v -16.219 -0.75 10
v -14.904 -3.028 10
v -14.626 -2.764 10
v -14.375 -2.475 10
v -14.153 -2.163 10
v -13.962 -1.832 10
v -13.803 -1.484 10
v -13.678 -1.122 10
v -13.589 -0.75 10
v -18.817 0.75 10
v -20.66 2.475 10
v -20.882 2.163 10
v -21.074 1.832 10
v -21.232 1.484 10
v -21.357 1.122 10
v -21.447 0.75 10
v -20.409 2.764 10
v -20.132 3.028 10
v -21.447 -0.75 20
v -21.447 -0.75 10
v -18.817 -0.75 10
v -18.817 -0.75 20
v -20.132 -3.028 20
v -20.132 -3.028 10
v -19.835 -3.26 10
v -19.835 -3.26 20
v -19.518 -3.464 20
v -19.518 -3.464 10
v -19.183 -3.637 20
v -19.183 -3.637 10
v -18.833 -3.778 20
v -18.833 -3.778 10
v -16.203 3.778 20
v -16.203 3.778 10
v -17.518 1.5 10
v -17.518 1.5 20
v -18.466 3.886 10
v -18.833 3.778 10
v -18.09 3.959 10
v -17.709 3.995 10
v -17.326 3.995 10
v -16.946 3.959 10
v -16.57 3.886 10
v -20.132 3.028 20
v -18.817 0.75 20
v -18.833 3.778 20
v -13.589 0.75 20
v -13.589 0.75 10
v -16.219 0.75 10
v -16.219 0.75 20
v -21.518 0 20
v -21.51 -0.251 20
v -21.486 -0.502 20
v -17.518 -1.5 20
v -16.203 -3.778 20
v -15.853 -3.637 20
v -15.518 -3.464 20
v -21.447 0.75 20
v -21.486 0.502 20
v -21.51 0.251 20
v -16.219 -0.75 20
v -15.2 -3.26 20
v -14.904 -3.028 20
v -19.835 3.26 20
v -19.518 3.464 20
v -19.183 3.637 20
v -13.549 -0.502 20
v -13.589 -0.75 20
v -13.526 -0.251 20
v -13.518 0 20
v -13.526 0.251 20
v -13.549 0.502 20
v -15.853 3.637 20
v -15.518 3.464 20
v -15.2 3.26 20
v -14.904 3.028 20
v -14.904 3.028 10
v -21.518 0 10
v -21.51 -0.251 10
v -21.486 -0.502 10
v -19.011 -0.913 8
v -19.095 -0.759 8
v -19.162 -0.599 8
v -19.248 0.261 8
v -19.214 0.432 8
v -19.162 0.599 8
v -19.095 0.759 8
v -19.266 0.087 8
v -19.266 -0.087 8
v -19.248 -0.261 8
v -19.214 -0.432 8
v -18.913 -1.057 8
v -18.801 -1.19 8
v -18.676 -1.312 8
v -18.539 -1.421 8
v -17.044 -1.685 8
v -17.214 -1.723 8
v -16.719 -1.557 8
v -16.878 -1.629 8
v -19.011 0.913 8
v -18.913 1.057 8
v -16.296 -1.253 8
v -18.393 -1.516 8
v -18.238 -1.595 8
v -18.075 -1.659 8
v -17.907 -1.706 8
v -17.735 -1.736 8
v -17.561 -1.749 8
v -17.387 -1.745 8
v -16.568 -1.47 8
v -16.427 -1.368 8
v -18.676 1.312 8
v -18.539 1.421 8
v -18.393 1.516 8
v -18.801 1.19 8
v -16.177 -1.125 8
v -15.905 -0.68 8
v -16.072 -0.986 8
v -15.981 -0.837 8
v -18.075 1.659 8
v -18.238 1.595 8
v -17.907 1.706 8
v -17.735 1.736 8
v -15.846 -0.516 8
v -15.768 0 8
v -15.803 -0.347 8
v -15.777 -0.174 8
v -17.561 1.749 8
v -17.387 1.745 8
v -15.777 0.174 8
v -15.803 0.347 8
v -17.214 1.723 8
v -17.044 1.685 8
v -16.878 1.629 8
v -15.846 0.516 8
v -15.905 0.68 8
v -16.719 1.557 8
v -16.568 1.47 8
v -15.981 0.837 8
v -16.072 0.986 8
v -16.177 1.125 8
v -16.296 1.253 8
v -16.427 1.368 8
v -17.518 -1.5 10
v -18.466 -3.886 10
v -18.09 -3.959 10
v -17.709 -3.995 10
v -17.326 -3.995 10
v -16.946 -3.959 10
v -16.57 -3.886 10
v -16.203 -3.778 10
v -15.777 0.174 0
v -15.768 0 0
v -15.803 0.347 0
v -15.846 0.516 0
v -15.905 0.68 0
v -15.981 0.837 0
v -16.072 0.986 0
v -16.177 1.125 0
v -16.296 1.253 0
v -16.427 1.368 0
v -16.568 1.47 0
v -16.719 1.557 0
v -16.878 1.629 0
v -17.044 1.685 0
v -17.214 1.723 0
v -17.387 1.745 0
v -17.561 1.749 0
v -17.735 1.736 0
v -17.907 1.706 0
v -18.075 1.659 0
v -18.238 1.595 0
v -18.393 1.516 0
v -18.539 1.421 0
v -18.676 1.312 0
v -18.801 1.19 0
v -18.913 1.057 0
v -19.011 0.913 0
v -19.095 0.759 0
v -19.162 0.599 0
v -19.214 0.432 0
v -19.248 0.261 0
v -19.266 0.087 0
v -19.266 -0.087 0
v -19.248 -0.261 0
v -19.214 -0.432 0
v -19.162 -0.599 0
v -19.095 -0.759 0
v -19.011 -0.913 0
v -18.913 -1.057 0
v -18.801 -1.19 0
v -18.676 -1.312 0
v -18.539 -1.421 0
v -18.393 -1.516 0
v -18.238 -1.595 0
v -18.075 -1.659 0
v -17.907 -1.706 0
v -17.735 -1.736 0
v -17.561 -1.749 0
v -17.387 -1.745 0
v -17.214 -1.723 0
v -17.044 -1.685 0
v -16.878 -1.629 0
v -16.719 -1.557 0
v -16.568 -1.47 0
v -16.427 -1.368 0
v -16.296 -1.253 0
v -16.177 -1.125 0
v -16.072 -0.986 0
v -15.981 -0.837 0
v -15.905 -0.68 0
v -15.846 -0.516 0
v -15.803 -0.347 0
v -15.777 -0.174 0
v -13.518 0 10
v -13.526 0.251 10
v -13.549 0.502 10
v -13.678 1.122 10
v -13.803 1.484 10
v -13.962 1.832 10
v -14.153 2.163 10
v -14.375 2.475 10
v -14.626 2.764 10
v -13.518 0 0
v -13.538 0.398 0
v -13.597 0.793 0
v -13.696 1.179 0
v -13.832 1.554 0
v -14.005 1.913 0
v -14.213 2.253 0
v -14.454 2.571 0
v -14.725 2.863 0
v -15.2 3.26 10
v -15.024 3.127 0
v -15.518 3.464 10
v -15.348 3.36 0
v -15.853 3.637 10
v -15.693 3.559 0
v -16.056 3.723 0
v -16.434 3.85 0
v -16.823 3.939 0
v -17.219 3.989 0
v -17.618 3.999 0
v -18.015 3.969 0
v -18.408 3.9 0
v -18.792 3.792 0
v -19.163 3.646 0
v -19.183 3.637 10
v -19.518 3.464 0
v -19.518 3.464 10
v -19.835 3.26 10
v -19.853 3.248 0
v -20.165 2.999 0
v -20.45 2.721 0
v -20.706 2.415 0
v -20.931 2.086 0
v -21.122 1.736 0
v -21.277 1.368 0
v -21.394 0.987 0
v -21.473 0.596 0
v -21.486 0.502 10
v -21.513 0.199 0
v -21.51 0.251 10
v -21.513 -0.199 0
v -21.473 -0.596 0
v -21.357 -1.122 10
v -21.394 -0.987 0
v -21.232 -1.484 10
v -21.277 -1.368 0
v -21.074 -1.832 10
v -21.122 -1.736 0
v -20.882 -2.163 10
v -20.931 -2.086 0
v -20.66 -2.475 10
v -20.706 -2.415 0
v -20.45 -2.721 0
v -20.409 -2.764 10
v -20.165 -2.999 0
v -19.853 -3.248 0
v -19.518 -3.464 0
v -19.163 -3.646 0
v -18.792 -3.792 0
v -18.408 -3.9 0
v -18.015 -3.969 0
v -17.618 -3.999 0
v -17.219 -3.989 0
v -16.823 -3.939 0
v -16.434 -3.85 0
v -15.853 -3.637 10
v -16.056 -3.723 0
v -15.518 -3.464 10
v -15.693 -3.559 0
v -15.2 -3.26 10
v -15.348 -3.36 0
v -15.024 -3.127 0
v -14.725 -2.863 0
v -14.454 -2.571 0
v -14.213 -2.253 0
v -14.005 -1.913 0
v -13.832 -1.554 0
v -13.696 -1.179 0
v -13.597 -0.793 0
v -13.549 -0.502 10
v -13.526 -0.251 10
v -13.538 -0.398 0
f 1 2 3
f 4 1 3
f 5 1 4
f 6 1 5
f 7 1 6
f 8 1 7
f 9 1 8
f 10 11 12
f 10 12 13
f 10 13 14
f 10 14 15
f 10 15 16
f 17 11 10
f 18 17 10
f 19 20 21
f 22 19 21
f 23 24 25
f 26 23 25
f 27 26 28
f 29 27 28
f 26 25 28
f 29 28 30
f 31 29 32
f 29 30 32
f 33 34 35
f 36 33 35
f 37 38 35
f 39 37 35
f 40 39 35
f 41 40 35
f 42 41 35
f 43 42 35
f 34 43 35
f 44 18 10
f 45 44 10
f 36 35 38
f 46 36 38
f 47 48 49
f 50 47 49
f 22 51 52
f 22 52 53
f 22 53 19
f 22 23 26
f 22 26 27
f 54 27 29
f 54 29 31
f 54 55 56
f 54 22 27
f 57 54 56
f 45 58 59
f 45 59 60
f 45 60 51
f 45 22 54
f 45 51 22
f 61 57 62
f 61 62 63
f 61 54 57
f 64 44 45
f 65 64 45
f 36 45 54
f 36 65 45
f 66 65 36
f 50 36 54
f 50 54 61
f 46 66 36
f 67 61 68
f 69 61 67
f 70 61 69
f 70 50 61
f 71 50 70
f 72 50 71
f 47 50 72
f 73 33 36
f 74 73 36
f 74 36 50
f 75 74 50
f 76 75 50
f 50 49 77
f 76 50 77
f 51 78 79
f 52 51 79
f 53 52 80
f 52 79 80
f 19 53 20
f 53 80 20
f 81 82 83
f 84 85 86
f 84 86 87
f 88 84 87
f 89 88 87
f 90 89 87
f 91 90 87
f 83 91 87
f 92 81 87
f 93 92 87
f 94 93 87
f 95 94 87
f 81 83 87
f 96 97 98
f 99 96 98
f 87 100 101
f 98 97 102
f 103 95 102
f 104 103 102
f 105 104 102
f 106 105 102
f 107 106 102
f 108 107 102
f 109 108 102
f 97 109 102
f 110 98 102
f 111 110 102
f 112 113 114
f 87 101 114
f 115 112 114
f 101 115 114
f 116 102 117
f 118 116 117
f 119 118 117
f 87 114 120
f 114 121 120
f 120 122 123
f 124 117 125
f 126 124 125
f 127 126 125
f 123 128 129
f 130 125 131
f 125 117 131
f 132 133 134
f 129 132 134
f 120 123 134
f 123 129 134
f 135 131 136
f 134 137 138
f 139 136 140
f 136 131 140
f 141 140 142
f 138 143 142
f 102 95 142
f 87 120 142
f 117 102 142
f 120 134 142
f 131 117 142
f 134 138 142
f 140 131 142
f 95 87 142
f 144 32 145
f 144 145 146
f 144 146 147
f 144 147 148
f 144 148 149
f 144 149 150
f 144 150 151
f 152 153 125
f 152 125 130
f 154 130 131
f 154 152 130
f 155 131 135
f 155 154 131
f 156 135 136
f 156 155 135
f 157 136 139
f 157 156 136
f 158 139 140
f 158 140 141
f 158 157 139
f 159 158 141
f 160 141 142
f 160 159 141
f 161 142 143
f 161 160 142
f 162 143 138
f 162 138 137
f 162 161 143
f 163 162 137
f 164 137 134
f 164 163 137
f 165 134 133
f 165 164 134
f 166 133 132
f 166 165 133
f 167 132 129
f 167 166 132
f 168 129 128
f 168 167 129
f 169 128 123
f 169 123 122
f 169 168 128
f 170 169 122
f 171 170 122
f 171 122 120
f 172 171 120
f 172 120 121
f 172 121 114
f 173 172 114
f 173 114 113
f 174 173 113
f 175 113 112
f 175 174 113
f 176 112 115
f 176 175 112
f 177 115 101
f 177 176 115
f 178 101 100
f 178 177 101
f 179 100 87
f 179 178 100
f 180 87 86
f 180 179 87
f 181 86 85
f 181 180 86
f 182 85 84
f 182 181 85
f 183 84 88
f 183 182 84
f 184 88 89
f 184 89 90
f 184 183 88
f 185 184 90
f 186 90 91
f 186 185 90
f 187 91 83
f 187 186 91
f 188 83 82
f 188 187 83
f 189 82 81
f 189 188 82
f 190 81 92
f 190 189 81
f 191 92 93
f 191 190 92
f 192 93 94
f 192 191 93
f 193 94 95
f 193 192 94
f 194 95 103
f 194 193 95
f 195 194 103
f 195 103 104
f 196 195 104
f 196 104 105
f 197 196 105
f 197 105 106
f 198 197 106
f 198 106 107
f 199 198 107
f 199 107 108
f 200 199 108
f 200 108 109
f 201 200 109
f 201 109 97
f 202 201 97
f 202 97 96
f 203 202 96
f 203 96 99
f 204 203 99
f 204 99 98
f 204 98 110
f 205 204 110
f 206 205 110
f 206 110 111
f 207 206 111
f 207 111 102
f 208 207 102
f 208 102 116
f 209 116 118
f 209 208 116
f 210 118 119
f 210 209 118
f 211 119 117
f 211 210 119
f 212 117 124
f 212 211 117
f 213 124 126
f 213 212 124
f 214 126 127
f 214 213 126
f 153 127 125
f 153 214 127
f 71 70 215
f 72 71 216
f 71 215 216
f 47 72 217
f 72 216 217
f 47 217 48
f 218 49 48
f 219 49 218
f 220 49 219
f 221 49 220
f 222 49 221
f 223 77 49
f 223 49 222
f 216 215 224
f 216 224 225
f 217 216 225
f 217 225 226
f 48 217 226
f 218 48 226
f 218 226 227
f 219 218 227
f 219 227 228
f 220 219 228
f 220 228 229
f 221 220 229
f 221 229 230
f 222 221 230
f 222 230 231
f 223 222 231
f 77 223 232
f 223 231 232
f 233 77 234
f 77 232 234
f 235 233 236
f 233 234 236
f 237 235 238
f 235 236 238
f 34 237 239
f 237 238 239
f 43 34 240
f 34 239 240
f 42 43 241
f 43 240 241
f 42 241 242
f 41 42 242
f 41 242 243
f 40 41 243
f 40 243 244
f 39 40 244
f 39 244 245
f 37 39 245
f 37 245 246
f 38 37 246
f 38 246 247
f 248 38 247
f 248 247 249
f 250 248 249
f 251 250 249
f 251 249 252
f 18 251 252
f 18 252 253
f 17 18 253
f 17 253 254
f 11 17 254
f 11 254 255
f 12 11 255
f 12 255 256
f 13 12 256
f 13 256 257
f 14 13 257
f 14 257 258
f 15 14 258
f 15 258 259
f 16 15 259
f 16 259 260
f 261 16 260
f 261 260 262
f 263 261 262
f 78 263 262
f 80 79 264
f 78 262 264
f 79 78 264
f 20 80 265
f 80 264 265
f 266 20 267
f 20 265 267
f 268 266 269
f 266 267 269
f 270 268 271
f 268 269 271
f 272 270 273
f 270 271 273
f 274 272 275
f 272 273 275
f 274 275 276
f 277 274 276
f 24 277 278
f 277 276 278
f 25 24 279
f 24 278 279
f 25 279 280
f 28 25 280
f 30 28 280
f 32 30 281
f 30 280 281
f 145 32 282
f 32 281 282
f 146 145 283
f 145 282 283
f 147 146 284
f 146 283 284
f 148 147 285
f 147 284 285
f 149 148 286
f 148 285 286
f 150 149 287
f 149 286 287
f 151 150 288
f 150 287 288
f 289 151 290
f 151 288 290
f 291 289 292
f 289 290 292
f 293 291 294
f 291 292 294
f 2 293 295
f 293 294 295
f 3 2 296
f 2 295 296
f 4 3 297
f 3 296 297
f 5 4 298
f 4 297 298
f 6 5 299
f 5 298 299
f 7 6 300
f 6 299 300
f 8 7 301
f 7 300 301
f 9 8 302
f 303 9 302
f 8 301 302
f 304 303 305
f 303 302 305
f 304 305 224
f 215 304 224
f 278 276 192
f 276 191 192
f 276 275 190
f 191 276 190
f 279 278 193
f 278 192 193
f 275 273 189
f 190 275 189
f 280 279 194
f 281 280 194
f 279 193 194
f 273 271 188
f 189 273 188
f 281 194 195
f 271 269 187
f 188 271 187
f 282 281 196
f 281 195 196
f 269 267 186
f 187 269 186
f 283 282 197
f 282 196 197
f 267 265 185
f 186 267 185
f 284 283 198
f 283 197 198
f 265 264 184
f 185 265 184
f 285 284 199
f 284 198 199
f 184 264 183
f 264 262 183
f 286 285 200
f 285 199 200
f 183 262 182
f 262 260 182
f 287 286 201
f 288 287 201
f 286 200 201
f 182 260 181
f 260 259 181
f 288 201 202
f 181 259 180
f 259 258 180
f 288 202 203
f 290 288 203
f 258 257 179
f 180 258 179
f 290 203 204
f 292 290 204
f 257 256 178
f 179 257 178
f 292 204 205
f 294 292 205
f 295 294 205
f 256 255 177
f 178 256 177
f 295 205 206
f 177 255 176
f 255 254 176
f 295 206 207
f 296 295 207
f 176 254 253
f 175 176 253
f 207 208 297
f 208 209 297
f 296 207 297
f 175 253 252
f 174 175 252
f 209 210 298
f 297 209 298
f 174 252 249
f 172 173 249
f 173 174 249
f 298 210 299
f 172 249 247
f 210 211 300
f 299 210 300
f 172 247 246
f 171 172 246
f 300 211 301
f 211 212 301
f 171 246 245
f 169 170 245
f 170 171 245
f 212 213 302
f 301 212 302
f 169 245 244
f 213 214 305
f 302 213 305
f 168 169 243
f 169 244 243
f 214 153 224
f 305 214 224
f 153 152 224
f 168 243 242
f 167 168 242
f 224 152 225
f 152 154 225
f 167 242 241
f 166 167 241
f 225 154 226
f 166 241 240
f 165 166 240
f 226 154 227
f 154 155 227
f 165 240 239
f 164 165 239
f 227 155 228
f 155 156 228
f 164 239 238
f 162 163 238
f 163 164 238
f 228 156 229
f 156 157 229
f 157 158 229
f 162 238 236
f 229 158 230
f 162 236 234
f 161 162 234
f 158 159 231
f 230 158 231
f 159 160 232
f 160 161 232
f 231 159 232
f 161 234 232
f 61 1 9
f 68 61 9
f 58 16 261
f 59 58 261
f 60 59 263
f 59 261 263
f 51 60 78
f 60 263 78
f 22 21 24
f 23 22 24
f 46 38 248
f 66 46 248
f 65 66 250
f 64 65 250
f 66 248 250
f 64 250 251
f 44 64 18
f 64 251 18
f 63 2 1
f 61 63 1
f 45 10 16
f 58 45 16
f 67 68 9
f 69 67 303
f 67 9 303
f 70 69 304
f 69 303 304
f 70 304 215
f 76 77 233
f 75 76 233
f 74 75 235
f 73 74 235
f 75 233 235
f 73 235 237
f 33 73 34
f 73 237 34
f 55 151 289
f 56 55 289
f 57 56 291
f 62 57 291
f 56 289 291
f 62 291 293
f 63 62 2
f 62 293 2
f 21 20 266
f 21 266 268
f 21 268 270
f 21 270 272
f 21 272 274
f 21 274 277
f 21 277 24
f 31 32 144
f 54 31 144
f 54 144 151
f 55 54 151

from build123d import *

# Parameters (mm, degrees)
F0_R     = 4
F0_R_2   = 1.75
F1_DEPTH = 10
F3_DEPTH = 8
F4_DEPTH = 10


with BuildPart() as f1:
    # F0 (on Top) → F1 (new body)
    with BuildSketch(Plane.XY):
        with Locations((-17.5178135131, 0)):
            Circle(F0_R)
        with Locations((-17.5178135131, 0)):
            Circle(F0_R_2, mode=Mode.SUBTRACT)
        with Locations((-17.5178135131, 0)):
            Circle(F0_R_2)
    extrude(amount=F1_DEPTH)

    # F0 (on Top) → F3 (cut)
    with BuildSketch(Plane.XY):
        with Locations((-17.5178135131, 0)):
            Circle(F0_R_2)
    extrude(amount=F3_DEPTH, mode=Mode.SUBTRACT)

    # F2 (on face) → F4 (join)
    with BuildSketch(Plane.XY.offset(10)):
        with BuildLine():
            Line((-16.6517881093, 0), (-13.5178135131, 0))
            ThreePointArc((-13.5178135131, 0), (-13.5355884036, 0.376673834), (-13.5887551017, 0.75))
            Line((-13.5887551017, 0.75), (-16.2187754074, 0.75))
            Line((-16.2187754074, 0.75), (-16.6517881093, 0))
        make_face()
        Polygon((-18.3838389169, 0), (-16.6517881093, 0), (-17.0848008112, 0.75), (-17.950826215, 0.75), align=None)
        with BuildLine():
            Line((-21.5178135131, 0), (-18.3838389169, 0))
            Line((-18.3838389169, 0), (-18.8168516188, 0.75))
            Line((-18.8168516188, 0.75), (-21.4468719245, 0.75))
            ThreePointArc((-21.4468719245, 0.75), (-21.5000386226, 0.376673834), (-21.5178135131, 0))
        make_face()
        with BuildLine():
            ThreePointArc((-13.5887551017, -0.75), (-13.5355884036, -0.376673834), (-13.5178135131, 0))
            Line((-13.5178135131, 0), (-16.6517881093, 0))
            Line((-16.6517881093, 0), (-16.2187754074, -0.75))
            Line((-16.2187754074, -0.75), (-13.5887551017, -0.75))
        make_face()
        Polygon((-17.0848008112, -0.75), (-16.6517881093, 0), (-18.3838389169, 0), (-17.950826215, -0.75), align=None)
        with BuildLine():
            Line((-18.8168516188, -0.75), (-18.3838389169, 0))
            Line((-18.3838389169, 0), (-21.5178135131, 0))
            ThreePointArc((-21.5178135131, 0), (-21.5000386226, -0.376673834), (-21.4468719245, -0.75))
            Line((-21.4468719245, -0.75), (-18.8168516188, -0.75))
        make_face()
        Polygon((-18.8168516188, 0.75), (-18.3838389169, 0), (-17.950826215, 0.75), align=None)
        Polygon((-17.0848008112, 0.75), (-16.6517881093, 0), (-16.2187754074, 0.75), align=None)
        Polygon((-16.2187754074, -0.75), (-16.6517881093, 0), (-17.0848008112, -0.75), align=None)
        Polygon((-17.950826215, -0.75), (-18.3838389169, 0), (-18.8168516188, -0.75), align=None)
        Polygon((-17.5178135131, -1.5), (-17.0848008112, -0.75), (-17.950826215, -0.75), align=None)
        with BuildLine():
            Line((-14.9037652546, -3.0276643972), (-16.2187754074, -0.75))
            Line((-16.2187754074, -0.75), (-17.0848008112, -0.75))
            Line((-17.0848008112, -0.75), (-17.5178135131, -1.5))
            Line((-17.5178135131, -1.5), (-16.2028033603, -3.7776643972))
            ThreePointArc((-16.2028033603, -3.7776643972), (-15.5178135131, -3.4641016151), (-14.9037652546, -3.0276643972))
        make_face()
        with BuildLine():
            Line((-17.5178135131, -1.5), (-17.950826215, -0.75))
            Line((-17.950826215, -0.75), (-18.8168516188, -0.75))
            Line((-18.8168516188, -0.75), (-20.1318617716, -3.0276643972))
            ThreePointArc((-20.1318617716, -3.0276643972), (-19.5178135131, -3.4641016151), (-18.832823666, -3.7776643972))
            Line((-18.832823666, -3.7776643972), (-17.5178135131, -1.5))
        make_face()
        Polygon((-17.950826215, 0.75), (-17.0848008112, 0.75), (-17.5178135131, 1.5), align=None)
        with BuildLine():
            Line((-20.1318617716, 3.0276643972), (-18.8168516188, 0.75))
            Line((-18.8168516188, 0.75), (-17.950826215, 0.75))
            Line((-17.950826215, 0.75), (-17.5178135131, 1.5))
            Line((-17.5178135131, 1.5), (-18.832823666, 3.7776643972))
            ThreePointArc((-18.832823666, 3.7776643972), (-19.5178135131, 3.4641016151), (-20.1318617716, 3.0276643972))
        make_face()
        with BuildLine():
            Line((-17.5178135131, 1.5), (-17.0848008112, 0.75))
            Line((-17.0848008112, 0.75), (-16.2187754074, 0.75))
            Line((-16.2187754074, 0.75), (-14.9037652546, 3.0276643972))
            ThreePointArc((-14.9037652546, 3.0276643972), (-15.5178135131, 3.4641016151), (-16.2028033603, 3.7776643972))
            Line((-16.2028033603, 3.7776643972), (-17.5178135131, 1.5))
        make_face()
    extrude(amount=F4_DEPTH)


solid = f1.part
